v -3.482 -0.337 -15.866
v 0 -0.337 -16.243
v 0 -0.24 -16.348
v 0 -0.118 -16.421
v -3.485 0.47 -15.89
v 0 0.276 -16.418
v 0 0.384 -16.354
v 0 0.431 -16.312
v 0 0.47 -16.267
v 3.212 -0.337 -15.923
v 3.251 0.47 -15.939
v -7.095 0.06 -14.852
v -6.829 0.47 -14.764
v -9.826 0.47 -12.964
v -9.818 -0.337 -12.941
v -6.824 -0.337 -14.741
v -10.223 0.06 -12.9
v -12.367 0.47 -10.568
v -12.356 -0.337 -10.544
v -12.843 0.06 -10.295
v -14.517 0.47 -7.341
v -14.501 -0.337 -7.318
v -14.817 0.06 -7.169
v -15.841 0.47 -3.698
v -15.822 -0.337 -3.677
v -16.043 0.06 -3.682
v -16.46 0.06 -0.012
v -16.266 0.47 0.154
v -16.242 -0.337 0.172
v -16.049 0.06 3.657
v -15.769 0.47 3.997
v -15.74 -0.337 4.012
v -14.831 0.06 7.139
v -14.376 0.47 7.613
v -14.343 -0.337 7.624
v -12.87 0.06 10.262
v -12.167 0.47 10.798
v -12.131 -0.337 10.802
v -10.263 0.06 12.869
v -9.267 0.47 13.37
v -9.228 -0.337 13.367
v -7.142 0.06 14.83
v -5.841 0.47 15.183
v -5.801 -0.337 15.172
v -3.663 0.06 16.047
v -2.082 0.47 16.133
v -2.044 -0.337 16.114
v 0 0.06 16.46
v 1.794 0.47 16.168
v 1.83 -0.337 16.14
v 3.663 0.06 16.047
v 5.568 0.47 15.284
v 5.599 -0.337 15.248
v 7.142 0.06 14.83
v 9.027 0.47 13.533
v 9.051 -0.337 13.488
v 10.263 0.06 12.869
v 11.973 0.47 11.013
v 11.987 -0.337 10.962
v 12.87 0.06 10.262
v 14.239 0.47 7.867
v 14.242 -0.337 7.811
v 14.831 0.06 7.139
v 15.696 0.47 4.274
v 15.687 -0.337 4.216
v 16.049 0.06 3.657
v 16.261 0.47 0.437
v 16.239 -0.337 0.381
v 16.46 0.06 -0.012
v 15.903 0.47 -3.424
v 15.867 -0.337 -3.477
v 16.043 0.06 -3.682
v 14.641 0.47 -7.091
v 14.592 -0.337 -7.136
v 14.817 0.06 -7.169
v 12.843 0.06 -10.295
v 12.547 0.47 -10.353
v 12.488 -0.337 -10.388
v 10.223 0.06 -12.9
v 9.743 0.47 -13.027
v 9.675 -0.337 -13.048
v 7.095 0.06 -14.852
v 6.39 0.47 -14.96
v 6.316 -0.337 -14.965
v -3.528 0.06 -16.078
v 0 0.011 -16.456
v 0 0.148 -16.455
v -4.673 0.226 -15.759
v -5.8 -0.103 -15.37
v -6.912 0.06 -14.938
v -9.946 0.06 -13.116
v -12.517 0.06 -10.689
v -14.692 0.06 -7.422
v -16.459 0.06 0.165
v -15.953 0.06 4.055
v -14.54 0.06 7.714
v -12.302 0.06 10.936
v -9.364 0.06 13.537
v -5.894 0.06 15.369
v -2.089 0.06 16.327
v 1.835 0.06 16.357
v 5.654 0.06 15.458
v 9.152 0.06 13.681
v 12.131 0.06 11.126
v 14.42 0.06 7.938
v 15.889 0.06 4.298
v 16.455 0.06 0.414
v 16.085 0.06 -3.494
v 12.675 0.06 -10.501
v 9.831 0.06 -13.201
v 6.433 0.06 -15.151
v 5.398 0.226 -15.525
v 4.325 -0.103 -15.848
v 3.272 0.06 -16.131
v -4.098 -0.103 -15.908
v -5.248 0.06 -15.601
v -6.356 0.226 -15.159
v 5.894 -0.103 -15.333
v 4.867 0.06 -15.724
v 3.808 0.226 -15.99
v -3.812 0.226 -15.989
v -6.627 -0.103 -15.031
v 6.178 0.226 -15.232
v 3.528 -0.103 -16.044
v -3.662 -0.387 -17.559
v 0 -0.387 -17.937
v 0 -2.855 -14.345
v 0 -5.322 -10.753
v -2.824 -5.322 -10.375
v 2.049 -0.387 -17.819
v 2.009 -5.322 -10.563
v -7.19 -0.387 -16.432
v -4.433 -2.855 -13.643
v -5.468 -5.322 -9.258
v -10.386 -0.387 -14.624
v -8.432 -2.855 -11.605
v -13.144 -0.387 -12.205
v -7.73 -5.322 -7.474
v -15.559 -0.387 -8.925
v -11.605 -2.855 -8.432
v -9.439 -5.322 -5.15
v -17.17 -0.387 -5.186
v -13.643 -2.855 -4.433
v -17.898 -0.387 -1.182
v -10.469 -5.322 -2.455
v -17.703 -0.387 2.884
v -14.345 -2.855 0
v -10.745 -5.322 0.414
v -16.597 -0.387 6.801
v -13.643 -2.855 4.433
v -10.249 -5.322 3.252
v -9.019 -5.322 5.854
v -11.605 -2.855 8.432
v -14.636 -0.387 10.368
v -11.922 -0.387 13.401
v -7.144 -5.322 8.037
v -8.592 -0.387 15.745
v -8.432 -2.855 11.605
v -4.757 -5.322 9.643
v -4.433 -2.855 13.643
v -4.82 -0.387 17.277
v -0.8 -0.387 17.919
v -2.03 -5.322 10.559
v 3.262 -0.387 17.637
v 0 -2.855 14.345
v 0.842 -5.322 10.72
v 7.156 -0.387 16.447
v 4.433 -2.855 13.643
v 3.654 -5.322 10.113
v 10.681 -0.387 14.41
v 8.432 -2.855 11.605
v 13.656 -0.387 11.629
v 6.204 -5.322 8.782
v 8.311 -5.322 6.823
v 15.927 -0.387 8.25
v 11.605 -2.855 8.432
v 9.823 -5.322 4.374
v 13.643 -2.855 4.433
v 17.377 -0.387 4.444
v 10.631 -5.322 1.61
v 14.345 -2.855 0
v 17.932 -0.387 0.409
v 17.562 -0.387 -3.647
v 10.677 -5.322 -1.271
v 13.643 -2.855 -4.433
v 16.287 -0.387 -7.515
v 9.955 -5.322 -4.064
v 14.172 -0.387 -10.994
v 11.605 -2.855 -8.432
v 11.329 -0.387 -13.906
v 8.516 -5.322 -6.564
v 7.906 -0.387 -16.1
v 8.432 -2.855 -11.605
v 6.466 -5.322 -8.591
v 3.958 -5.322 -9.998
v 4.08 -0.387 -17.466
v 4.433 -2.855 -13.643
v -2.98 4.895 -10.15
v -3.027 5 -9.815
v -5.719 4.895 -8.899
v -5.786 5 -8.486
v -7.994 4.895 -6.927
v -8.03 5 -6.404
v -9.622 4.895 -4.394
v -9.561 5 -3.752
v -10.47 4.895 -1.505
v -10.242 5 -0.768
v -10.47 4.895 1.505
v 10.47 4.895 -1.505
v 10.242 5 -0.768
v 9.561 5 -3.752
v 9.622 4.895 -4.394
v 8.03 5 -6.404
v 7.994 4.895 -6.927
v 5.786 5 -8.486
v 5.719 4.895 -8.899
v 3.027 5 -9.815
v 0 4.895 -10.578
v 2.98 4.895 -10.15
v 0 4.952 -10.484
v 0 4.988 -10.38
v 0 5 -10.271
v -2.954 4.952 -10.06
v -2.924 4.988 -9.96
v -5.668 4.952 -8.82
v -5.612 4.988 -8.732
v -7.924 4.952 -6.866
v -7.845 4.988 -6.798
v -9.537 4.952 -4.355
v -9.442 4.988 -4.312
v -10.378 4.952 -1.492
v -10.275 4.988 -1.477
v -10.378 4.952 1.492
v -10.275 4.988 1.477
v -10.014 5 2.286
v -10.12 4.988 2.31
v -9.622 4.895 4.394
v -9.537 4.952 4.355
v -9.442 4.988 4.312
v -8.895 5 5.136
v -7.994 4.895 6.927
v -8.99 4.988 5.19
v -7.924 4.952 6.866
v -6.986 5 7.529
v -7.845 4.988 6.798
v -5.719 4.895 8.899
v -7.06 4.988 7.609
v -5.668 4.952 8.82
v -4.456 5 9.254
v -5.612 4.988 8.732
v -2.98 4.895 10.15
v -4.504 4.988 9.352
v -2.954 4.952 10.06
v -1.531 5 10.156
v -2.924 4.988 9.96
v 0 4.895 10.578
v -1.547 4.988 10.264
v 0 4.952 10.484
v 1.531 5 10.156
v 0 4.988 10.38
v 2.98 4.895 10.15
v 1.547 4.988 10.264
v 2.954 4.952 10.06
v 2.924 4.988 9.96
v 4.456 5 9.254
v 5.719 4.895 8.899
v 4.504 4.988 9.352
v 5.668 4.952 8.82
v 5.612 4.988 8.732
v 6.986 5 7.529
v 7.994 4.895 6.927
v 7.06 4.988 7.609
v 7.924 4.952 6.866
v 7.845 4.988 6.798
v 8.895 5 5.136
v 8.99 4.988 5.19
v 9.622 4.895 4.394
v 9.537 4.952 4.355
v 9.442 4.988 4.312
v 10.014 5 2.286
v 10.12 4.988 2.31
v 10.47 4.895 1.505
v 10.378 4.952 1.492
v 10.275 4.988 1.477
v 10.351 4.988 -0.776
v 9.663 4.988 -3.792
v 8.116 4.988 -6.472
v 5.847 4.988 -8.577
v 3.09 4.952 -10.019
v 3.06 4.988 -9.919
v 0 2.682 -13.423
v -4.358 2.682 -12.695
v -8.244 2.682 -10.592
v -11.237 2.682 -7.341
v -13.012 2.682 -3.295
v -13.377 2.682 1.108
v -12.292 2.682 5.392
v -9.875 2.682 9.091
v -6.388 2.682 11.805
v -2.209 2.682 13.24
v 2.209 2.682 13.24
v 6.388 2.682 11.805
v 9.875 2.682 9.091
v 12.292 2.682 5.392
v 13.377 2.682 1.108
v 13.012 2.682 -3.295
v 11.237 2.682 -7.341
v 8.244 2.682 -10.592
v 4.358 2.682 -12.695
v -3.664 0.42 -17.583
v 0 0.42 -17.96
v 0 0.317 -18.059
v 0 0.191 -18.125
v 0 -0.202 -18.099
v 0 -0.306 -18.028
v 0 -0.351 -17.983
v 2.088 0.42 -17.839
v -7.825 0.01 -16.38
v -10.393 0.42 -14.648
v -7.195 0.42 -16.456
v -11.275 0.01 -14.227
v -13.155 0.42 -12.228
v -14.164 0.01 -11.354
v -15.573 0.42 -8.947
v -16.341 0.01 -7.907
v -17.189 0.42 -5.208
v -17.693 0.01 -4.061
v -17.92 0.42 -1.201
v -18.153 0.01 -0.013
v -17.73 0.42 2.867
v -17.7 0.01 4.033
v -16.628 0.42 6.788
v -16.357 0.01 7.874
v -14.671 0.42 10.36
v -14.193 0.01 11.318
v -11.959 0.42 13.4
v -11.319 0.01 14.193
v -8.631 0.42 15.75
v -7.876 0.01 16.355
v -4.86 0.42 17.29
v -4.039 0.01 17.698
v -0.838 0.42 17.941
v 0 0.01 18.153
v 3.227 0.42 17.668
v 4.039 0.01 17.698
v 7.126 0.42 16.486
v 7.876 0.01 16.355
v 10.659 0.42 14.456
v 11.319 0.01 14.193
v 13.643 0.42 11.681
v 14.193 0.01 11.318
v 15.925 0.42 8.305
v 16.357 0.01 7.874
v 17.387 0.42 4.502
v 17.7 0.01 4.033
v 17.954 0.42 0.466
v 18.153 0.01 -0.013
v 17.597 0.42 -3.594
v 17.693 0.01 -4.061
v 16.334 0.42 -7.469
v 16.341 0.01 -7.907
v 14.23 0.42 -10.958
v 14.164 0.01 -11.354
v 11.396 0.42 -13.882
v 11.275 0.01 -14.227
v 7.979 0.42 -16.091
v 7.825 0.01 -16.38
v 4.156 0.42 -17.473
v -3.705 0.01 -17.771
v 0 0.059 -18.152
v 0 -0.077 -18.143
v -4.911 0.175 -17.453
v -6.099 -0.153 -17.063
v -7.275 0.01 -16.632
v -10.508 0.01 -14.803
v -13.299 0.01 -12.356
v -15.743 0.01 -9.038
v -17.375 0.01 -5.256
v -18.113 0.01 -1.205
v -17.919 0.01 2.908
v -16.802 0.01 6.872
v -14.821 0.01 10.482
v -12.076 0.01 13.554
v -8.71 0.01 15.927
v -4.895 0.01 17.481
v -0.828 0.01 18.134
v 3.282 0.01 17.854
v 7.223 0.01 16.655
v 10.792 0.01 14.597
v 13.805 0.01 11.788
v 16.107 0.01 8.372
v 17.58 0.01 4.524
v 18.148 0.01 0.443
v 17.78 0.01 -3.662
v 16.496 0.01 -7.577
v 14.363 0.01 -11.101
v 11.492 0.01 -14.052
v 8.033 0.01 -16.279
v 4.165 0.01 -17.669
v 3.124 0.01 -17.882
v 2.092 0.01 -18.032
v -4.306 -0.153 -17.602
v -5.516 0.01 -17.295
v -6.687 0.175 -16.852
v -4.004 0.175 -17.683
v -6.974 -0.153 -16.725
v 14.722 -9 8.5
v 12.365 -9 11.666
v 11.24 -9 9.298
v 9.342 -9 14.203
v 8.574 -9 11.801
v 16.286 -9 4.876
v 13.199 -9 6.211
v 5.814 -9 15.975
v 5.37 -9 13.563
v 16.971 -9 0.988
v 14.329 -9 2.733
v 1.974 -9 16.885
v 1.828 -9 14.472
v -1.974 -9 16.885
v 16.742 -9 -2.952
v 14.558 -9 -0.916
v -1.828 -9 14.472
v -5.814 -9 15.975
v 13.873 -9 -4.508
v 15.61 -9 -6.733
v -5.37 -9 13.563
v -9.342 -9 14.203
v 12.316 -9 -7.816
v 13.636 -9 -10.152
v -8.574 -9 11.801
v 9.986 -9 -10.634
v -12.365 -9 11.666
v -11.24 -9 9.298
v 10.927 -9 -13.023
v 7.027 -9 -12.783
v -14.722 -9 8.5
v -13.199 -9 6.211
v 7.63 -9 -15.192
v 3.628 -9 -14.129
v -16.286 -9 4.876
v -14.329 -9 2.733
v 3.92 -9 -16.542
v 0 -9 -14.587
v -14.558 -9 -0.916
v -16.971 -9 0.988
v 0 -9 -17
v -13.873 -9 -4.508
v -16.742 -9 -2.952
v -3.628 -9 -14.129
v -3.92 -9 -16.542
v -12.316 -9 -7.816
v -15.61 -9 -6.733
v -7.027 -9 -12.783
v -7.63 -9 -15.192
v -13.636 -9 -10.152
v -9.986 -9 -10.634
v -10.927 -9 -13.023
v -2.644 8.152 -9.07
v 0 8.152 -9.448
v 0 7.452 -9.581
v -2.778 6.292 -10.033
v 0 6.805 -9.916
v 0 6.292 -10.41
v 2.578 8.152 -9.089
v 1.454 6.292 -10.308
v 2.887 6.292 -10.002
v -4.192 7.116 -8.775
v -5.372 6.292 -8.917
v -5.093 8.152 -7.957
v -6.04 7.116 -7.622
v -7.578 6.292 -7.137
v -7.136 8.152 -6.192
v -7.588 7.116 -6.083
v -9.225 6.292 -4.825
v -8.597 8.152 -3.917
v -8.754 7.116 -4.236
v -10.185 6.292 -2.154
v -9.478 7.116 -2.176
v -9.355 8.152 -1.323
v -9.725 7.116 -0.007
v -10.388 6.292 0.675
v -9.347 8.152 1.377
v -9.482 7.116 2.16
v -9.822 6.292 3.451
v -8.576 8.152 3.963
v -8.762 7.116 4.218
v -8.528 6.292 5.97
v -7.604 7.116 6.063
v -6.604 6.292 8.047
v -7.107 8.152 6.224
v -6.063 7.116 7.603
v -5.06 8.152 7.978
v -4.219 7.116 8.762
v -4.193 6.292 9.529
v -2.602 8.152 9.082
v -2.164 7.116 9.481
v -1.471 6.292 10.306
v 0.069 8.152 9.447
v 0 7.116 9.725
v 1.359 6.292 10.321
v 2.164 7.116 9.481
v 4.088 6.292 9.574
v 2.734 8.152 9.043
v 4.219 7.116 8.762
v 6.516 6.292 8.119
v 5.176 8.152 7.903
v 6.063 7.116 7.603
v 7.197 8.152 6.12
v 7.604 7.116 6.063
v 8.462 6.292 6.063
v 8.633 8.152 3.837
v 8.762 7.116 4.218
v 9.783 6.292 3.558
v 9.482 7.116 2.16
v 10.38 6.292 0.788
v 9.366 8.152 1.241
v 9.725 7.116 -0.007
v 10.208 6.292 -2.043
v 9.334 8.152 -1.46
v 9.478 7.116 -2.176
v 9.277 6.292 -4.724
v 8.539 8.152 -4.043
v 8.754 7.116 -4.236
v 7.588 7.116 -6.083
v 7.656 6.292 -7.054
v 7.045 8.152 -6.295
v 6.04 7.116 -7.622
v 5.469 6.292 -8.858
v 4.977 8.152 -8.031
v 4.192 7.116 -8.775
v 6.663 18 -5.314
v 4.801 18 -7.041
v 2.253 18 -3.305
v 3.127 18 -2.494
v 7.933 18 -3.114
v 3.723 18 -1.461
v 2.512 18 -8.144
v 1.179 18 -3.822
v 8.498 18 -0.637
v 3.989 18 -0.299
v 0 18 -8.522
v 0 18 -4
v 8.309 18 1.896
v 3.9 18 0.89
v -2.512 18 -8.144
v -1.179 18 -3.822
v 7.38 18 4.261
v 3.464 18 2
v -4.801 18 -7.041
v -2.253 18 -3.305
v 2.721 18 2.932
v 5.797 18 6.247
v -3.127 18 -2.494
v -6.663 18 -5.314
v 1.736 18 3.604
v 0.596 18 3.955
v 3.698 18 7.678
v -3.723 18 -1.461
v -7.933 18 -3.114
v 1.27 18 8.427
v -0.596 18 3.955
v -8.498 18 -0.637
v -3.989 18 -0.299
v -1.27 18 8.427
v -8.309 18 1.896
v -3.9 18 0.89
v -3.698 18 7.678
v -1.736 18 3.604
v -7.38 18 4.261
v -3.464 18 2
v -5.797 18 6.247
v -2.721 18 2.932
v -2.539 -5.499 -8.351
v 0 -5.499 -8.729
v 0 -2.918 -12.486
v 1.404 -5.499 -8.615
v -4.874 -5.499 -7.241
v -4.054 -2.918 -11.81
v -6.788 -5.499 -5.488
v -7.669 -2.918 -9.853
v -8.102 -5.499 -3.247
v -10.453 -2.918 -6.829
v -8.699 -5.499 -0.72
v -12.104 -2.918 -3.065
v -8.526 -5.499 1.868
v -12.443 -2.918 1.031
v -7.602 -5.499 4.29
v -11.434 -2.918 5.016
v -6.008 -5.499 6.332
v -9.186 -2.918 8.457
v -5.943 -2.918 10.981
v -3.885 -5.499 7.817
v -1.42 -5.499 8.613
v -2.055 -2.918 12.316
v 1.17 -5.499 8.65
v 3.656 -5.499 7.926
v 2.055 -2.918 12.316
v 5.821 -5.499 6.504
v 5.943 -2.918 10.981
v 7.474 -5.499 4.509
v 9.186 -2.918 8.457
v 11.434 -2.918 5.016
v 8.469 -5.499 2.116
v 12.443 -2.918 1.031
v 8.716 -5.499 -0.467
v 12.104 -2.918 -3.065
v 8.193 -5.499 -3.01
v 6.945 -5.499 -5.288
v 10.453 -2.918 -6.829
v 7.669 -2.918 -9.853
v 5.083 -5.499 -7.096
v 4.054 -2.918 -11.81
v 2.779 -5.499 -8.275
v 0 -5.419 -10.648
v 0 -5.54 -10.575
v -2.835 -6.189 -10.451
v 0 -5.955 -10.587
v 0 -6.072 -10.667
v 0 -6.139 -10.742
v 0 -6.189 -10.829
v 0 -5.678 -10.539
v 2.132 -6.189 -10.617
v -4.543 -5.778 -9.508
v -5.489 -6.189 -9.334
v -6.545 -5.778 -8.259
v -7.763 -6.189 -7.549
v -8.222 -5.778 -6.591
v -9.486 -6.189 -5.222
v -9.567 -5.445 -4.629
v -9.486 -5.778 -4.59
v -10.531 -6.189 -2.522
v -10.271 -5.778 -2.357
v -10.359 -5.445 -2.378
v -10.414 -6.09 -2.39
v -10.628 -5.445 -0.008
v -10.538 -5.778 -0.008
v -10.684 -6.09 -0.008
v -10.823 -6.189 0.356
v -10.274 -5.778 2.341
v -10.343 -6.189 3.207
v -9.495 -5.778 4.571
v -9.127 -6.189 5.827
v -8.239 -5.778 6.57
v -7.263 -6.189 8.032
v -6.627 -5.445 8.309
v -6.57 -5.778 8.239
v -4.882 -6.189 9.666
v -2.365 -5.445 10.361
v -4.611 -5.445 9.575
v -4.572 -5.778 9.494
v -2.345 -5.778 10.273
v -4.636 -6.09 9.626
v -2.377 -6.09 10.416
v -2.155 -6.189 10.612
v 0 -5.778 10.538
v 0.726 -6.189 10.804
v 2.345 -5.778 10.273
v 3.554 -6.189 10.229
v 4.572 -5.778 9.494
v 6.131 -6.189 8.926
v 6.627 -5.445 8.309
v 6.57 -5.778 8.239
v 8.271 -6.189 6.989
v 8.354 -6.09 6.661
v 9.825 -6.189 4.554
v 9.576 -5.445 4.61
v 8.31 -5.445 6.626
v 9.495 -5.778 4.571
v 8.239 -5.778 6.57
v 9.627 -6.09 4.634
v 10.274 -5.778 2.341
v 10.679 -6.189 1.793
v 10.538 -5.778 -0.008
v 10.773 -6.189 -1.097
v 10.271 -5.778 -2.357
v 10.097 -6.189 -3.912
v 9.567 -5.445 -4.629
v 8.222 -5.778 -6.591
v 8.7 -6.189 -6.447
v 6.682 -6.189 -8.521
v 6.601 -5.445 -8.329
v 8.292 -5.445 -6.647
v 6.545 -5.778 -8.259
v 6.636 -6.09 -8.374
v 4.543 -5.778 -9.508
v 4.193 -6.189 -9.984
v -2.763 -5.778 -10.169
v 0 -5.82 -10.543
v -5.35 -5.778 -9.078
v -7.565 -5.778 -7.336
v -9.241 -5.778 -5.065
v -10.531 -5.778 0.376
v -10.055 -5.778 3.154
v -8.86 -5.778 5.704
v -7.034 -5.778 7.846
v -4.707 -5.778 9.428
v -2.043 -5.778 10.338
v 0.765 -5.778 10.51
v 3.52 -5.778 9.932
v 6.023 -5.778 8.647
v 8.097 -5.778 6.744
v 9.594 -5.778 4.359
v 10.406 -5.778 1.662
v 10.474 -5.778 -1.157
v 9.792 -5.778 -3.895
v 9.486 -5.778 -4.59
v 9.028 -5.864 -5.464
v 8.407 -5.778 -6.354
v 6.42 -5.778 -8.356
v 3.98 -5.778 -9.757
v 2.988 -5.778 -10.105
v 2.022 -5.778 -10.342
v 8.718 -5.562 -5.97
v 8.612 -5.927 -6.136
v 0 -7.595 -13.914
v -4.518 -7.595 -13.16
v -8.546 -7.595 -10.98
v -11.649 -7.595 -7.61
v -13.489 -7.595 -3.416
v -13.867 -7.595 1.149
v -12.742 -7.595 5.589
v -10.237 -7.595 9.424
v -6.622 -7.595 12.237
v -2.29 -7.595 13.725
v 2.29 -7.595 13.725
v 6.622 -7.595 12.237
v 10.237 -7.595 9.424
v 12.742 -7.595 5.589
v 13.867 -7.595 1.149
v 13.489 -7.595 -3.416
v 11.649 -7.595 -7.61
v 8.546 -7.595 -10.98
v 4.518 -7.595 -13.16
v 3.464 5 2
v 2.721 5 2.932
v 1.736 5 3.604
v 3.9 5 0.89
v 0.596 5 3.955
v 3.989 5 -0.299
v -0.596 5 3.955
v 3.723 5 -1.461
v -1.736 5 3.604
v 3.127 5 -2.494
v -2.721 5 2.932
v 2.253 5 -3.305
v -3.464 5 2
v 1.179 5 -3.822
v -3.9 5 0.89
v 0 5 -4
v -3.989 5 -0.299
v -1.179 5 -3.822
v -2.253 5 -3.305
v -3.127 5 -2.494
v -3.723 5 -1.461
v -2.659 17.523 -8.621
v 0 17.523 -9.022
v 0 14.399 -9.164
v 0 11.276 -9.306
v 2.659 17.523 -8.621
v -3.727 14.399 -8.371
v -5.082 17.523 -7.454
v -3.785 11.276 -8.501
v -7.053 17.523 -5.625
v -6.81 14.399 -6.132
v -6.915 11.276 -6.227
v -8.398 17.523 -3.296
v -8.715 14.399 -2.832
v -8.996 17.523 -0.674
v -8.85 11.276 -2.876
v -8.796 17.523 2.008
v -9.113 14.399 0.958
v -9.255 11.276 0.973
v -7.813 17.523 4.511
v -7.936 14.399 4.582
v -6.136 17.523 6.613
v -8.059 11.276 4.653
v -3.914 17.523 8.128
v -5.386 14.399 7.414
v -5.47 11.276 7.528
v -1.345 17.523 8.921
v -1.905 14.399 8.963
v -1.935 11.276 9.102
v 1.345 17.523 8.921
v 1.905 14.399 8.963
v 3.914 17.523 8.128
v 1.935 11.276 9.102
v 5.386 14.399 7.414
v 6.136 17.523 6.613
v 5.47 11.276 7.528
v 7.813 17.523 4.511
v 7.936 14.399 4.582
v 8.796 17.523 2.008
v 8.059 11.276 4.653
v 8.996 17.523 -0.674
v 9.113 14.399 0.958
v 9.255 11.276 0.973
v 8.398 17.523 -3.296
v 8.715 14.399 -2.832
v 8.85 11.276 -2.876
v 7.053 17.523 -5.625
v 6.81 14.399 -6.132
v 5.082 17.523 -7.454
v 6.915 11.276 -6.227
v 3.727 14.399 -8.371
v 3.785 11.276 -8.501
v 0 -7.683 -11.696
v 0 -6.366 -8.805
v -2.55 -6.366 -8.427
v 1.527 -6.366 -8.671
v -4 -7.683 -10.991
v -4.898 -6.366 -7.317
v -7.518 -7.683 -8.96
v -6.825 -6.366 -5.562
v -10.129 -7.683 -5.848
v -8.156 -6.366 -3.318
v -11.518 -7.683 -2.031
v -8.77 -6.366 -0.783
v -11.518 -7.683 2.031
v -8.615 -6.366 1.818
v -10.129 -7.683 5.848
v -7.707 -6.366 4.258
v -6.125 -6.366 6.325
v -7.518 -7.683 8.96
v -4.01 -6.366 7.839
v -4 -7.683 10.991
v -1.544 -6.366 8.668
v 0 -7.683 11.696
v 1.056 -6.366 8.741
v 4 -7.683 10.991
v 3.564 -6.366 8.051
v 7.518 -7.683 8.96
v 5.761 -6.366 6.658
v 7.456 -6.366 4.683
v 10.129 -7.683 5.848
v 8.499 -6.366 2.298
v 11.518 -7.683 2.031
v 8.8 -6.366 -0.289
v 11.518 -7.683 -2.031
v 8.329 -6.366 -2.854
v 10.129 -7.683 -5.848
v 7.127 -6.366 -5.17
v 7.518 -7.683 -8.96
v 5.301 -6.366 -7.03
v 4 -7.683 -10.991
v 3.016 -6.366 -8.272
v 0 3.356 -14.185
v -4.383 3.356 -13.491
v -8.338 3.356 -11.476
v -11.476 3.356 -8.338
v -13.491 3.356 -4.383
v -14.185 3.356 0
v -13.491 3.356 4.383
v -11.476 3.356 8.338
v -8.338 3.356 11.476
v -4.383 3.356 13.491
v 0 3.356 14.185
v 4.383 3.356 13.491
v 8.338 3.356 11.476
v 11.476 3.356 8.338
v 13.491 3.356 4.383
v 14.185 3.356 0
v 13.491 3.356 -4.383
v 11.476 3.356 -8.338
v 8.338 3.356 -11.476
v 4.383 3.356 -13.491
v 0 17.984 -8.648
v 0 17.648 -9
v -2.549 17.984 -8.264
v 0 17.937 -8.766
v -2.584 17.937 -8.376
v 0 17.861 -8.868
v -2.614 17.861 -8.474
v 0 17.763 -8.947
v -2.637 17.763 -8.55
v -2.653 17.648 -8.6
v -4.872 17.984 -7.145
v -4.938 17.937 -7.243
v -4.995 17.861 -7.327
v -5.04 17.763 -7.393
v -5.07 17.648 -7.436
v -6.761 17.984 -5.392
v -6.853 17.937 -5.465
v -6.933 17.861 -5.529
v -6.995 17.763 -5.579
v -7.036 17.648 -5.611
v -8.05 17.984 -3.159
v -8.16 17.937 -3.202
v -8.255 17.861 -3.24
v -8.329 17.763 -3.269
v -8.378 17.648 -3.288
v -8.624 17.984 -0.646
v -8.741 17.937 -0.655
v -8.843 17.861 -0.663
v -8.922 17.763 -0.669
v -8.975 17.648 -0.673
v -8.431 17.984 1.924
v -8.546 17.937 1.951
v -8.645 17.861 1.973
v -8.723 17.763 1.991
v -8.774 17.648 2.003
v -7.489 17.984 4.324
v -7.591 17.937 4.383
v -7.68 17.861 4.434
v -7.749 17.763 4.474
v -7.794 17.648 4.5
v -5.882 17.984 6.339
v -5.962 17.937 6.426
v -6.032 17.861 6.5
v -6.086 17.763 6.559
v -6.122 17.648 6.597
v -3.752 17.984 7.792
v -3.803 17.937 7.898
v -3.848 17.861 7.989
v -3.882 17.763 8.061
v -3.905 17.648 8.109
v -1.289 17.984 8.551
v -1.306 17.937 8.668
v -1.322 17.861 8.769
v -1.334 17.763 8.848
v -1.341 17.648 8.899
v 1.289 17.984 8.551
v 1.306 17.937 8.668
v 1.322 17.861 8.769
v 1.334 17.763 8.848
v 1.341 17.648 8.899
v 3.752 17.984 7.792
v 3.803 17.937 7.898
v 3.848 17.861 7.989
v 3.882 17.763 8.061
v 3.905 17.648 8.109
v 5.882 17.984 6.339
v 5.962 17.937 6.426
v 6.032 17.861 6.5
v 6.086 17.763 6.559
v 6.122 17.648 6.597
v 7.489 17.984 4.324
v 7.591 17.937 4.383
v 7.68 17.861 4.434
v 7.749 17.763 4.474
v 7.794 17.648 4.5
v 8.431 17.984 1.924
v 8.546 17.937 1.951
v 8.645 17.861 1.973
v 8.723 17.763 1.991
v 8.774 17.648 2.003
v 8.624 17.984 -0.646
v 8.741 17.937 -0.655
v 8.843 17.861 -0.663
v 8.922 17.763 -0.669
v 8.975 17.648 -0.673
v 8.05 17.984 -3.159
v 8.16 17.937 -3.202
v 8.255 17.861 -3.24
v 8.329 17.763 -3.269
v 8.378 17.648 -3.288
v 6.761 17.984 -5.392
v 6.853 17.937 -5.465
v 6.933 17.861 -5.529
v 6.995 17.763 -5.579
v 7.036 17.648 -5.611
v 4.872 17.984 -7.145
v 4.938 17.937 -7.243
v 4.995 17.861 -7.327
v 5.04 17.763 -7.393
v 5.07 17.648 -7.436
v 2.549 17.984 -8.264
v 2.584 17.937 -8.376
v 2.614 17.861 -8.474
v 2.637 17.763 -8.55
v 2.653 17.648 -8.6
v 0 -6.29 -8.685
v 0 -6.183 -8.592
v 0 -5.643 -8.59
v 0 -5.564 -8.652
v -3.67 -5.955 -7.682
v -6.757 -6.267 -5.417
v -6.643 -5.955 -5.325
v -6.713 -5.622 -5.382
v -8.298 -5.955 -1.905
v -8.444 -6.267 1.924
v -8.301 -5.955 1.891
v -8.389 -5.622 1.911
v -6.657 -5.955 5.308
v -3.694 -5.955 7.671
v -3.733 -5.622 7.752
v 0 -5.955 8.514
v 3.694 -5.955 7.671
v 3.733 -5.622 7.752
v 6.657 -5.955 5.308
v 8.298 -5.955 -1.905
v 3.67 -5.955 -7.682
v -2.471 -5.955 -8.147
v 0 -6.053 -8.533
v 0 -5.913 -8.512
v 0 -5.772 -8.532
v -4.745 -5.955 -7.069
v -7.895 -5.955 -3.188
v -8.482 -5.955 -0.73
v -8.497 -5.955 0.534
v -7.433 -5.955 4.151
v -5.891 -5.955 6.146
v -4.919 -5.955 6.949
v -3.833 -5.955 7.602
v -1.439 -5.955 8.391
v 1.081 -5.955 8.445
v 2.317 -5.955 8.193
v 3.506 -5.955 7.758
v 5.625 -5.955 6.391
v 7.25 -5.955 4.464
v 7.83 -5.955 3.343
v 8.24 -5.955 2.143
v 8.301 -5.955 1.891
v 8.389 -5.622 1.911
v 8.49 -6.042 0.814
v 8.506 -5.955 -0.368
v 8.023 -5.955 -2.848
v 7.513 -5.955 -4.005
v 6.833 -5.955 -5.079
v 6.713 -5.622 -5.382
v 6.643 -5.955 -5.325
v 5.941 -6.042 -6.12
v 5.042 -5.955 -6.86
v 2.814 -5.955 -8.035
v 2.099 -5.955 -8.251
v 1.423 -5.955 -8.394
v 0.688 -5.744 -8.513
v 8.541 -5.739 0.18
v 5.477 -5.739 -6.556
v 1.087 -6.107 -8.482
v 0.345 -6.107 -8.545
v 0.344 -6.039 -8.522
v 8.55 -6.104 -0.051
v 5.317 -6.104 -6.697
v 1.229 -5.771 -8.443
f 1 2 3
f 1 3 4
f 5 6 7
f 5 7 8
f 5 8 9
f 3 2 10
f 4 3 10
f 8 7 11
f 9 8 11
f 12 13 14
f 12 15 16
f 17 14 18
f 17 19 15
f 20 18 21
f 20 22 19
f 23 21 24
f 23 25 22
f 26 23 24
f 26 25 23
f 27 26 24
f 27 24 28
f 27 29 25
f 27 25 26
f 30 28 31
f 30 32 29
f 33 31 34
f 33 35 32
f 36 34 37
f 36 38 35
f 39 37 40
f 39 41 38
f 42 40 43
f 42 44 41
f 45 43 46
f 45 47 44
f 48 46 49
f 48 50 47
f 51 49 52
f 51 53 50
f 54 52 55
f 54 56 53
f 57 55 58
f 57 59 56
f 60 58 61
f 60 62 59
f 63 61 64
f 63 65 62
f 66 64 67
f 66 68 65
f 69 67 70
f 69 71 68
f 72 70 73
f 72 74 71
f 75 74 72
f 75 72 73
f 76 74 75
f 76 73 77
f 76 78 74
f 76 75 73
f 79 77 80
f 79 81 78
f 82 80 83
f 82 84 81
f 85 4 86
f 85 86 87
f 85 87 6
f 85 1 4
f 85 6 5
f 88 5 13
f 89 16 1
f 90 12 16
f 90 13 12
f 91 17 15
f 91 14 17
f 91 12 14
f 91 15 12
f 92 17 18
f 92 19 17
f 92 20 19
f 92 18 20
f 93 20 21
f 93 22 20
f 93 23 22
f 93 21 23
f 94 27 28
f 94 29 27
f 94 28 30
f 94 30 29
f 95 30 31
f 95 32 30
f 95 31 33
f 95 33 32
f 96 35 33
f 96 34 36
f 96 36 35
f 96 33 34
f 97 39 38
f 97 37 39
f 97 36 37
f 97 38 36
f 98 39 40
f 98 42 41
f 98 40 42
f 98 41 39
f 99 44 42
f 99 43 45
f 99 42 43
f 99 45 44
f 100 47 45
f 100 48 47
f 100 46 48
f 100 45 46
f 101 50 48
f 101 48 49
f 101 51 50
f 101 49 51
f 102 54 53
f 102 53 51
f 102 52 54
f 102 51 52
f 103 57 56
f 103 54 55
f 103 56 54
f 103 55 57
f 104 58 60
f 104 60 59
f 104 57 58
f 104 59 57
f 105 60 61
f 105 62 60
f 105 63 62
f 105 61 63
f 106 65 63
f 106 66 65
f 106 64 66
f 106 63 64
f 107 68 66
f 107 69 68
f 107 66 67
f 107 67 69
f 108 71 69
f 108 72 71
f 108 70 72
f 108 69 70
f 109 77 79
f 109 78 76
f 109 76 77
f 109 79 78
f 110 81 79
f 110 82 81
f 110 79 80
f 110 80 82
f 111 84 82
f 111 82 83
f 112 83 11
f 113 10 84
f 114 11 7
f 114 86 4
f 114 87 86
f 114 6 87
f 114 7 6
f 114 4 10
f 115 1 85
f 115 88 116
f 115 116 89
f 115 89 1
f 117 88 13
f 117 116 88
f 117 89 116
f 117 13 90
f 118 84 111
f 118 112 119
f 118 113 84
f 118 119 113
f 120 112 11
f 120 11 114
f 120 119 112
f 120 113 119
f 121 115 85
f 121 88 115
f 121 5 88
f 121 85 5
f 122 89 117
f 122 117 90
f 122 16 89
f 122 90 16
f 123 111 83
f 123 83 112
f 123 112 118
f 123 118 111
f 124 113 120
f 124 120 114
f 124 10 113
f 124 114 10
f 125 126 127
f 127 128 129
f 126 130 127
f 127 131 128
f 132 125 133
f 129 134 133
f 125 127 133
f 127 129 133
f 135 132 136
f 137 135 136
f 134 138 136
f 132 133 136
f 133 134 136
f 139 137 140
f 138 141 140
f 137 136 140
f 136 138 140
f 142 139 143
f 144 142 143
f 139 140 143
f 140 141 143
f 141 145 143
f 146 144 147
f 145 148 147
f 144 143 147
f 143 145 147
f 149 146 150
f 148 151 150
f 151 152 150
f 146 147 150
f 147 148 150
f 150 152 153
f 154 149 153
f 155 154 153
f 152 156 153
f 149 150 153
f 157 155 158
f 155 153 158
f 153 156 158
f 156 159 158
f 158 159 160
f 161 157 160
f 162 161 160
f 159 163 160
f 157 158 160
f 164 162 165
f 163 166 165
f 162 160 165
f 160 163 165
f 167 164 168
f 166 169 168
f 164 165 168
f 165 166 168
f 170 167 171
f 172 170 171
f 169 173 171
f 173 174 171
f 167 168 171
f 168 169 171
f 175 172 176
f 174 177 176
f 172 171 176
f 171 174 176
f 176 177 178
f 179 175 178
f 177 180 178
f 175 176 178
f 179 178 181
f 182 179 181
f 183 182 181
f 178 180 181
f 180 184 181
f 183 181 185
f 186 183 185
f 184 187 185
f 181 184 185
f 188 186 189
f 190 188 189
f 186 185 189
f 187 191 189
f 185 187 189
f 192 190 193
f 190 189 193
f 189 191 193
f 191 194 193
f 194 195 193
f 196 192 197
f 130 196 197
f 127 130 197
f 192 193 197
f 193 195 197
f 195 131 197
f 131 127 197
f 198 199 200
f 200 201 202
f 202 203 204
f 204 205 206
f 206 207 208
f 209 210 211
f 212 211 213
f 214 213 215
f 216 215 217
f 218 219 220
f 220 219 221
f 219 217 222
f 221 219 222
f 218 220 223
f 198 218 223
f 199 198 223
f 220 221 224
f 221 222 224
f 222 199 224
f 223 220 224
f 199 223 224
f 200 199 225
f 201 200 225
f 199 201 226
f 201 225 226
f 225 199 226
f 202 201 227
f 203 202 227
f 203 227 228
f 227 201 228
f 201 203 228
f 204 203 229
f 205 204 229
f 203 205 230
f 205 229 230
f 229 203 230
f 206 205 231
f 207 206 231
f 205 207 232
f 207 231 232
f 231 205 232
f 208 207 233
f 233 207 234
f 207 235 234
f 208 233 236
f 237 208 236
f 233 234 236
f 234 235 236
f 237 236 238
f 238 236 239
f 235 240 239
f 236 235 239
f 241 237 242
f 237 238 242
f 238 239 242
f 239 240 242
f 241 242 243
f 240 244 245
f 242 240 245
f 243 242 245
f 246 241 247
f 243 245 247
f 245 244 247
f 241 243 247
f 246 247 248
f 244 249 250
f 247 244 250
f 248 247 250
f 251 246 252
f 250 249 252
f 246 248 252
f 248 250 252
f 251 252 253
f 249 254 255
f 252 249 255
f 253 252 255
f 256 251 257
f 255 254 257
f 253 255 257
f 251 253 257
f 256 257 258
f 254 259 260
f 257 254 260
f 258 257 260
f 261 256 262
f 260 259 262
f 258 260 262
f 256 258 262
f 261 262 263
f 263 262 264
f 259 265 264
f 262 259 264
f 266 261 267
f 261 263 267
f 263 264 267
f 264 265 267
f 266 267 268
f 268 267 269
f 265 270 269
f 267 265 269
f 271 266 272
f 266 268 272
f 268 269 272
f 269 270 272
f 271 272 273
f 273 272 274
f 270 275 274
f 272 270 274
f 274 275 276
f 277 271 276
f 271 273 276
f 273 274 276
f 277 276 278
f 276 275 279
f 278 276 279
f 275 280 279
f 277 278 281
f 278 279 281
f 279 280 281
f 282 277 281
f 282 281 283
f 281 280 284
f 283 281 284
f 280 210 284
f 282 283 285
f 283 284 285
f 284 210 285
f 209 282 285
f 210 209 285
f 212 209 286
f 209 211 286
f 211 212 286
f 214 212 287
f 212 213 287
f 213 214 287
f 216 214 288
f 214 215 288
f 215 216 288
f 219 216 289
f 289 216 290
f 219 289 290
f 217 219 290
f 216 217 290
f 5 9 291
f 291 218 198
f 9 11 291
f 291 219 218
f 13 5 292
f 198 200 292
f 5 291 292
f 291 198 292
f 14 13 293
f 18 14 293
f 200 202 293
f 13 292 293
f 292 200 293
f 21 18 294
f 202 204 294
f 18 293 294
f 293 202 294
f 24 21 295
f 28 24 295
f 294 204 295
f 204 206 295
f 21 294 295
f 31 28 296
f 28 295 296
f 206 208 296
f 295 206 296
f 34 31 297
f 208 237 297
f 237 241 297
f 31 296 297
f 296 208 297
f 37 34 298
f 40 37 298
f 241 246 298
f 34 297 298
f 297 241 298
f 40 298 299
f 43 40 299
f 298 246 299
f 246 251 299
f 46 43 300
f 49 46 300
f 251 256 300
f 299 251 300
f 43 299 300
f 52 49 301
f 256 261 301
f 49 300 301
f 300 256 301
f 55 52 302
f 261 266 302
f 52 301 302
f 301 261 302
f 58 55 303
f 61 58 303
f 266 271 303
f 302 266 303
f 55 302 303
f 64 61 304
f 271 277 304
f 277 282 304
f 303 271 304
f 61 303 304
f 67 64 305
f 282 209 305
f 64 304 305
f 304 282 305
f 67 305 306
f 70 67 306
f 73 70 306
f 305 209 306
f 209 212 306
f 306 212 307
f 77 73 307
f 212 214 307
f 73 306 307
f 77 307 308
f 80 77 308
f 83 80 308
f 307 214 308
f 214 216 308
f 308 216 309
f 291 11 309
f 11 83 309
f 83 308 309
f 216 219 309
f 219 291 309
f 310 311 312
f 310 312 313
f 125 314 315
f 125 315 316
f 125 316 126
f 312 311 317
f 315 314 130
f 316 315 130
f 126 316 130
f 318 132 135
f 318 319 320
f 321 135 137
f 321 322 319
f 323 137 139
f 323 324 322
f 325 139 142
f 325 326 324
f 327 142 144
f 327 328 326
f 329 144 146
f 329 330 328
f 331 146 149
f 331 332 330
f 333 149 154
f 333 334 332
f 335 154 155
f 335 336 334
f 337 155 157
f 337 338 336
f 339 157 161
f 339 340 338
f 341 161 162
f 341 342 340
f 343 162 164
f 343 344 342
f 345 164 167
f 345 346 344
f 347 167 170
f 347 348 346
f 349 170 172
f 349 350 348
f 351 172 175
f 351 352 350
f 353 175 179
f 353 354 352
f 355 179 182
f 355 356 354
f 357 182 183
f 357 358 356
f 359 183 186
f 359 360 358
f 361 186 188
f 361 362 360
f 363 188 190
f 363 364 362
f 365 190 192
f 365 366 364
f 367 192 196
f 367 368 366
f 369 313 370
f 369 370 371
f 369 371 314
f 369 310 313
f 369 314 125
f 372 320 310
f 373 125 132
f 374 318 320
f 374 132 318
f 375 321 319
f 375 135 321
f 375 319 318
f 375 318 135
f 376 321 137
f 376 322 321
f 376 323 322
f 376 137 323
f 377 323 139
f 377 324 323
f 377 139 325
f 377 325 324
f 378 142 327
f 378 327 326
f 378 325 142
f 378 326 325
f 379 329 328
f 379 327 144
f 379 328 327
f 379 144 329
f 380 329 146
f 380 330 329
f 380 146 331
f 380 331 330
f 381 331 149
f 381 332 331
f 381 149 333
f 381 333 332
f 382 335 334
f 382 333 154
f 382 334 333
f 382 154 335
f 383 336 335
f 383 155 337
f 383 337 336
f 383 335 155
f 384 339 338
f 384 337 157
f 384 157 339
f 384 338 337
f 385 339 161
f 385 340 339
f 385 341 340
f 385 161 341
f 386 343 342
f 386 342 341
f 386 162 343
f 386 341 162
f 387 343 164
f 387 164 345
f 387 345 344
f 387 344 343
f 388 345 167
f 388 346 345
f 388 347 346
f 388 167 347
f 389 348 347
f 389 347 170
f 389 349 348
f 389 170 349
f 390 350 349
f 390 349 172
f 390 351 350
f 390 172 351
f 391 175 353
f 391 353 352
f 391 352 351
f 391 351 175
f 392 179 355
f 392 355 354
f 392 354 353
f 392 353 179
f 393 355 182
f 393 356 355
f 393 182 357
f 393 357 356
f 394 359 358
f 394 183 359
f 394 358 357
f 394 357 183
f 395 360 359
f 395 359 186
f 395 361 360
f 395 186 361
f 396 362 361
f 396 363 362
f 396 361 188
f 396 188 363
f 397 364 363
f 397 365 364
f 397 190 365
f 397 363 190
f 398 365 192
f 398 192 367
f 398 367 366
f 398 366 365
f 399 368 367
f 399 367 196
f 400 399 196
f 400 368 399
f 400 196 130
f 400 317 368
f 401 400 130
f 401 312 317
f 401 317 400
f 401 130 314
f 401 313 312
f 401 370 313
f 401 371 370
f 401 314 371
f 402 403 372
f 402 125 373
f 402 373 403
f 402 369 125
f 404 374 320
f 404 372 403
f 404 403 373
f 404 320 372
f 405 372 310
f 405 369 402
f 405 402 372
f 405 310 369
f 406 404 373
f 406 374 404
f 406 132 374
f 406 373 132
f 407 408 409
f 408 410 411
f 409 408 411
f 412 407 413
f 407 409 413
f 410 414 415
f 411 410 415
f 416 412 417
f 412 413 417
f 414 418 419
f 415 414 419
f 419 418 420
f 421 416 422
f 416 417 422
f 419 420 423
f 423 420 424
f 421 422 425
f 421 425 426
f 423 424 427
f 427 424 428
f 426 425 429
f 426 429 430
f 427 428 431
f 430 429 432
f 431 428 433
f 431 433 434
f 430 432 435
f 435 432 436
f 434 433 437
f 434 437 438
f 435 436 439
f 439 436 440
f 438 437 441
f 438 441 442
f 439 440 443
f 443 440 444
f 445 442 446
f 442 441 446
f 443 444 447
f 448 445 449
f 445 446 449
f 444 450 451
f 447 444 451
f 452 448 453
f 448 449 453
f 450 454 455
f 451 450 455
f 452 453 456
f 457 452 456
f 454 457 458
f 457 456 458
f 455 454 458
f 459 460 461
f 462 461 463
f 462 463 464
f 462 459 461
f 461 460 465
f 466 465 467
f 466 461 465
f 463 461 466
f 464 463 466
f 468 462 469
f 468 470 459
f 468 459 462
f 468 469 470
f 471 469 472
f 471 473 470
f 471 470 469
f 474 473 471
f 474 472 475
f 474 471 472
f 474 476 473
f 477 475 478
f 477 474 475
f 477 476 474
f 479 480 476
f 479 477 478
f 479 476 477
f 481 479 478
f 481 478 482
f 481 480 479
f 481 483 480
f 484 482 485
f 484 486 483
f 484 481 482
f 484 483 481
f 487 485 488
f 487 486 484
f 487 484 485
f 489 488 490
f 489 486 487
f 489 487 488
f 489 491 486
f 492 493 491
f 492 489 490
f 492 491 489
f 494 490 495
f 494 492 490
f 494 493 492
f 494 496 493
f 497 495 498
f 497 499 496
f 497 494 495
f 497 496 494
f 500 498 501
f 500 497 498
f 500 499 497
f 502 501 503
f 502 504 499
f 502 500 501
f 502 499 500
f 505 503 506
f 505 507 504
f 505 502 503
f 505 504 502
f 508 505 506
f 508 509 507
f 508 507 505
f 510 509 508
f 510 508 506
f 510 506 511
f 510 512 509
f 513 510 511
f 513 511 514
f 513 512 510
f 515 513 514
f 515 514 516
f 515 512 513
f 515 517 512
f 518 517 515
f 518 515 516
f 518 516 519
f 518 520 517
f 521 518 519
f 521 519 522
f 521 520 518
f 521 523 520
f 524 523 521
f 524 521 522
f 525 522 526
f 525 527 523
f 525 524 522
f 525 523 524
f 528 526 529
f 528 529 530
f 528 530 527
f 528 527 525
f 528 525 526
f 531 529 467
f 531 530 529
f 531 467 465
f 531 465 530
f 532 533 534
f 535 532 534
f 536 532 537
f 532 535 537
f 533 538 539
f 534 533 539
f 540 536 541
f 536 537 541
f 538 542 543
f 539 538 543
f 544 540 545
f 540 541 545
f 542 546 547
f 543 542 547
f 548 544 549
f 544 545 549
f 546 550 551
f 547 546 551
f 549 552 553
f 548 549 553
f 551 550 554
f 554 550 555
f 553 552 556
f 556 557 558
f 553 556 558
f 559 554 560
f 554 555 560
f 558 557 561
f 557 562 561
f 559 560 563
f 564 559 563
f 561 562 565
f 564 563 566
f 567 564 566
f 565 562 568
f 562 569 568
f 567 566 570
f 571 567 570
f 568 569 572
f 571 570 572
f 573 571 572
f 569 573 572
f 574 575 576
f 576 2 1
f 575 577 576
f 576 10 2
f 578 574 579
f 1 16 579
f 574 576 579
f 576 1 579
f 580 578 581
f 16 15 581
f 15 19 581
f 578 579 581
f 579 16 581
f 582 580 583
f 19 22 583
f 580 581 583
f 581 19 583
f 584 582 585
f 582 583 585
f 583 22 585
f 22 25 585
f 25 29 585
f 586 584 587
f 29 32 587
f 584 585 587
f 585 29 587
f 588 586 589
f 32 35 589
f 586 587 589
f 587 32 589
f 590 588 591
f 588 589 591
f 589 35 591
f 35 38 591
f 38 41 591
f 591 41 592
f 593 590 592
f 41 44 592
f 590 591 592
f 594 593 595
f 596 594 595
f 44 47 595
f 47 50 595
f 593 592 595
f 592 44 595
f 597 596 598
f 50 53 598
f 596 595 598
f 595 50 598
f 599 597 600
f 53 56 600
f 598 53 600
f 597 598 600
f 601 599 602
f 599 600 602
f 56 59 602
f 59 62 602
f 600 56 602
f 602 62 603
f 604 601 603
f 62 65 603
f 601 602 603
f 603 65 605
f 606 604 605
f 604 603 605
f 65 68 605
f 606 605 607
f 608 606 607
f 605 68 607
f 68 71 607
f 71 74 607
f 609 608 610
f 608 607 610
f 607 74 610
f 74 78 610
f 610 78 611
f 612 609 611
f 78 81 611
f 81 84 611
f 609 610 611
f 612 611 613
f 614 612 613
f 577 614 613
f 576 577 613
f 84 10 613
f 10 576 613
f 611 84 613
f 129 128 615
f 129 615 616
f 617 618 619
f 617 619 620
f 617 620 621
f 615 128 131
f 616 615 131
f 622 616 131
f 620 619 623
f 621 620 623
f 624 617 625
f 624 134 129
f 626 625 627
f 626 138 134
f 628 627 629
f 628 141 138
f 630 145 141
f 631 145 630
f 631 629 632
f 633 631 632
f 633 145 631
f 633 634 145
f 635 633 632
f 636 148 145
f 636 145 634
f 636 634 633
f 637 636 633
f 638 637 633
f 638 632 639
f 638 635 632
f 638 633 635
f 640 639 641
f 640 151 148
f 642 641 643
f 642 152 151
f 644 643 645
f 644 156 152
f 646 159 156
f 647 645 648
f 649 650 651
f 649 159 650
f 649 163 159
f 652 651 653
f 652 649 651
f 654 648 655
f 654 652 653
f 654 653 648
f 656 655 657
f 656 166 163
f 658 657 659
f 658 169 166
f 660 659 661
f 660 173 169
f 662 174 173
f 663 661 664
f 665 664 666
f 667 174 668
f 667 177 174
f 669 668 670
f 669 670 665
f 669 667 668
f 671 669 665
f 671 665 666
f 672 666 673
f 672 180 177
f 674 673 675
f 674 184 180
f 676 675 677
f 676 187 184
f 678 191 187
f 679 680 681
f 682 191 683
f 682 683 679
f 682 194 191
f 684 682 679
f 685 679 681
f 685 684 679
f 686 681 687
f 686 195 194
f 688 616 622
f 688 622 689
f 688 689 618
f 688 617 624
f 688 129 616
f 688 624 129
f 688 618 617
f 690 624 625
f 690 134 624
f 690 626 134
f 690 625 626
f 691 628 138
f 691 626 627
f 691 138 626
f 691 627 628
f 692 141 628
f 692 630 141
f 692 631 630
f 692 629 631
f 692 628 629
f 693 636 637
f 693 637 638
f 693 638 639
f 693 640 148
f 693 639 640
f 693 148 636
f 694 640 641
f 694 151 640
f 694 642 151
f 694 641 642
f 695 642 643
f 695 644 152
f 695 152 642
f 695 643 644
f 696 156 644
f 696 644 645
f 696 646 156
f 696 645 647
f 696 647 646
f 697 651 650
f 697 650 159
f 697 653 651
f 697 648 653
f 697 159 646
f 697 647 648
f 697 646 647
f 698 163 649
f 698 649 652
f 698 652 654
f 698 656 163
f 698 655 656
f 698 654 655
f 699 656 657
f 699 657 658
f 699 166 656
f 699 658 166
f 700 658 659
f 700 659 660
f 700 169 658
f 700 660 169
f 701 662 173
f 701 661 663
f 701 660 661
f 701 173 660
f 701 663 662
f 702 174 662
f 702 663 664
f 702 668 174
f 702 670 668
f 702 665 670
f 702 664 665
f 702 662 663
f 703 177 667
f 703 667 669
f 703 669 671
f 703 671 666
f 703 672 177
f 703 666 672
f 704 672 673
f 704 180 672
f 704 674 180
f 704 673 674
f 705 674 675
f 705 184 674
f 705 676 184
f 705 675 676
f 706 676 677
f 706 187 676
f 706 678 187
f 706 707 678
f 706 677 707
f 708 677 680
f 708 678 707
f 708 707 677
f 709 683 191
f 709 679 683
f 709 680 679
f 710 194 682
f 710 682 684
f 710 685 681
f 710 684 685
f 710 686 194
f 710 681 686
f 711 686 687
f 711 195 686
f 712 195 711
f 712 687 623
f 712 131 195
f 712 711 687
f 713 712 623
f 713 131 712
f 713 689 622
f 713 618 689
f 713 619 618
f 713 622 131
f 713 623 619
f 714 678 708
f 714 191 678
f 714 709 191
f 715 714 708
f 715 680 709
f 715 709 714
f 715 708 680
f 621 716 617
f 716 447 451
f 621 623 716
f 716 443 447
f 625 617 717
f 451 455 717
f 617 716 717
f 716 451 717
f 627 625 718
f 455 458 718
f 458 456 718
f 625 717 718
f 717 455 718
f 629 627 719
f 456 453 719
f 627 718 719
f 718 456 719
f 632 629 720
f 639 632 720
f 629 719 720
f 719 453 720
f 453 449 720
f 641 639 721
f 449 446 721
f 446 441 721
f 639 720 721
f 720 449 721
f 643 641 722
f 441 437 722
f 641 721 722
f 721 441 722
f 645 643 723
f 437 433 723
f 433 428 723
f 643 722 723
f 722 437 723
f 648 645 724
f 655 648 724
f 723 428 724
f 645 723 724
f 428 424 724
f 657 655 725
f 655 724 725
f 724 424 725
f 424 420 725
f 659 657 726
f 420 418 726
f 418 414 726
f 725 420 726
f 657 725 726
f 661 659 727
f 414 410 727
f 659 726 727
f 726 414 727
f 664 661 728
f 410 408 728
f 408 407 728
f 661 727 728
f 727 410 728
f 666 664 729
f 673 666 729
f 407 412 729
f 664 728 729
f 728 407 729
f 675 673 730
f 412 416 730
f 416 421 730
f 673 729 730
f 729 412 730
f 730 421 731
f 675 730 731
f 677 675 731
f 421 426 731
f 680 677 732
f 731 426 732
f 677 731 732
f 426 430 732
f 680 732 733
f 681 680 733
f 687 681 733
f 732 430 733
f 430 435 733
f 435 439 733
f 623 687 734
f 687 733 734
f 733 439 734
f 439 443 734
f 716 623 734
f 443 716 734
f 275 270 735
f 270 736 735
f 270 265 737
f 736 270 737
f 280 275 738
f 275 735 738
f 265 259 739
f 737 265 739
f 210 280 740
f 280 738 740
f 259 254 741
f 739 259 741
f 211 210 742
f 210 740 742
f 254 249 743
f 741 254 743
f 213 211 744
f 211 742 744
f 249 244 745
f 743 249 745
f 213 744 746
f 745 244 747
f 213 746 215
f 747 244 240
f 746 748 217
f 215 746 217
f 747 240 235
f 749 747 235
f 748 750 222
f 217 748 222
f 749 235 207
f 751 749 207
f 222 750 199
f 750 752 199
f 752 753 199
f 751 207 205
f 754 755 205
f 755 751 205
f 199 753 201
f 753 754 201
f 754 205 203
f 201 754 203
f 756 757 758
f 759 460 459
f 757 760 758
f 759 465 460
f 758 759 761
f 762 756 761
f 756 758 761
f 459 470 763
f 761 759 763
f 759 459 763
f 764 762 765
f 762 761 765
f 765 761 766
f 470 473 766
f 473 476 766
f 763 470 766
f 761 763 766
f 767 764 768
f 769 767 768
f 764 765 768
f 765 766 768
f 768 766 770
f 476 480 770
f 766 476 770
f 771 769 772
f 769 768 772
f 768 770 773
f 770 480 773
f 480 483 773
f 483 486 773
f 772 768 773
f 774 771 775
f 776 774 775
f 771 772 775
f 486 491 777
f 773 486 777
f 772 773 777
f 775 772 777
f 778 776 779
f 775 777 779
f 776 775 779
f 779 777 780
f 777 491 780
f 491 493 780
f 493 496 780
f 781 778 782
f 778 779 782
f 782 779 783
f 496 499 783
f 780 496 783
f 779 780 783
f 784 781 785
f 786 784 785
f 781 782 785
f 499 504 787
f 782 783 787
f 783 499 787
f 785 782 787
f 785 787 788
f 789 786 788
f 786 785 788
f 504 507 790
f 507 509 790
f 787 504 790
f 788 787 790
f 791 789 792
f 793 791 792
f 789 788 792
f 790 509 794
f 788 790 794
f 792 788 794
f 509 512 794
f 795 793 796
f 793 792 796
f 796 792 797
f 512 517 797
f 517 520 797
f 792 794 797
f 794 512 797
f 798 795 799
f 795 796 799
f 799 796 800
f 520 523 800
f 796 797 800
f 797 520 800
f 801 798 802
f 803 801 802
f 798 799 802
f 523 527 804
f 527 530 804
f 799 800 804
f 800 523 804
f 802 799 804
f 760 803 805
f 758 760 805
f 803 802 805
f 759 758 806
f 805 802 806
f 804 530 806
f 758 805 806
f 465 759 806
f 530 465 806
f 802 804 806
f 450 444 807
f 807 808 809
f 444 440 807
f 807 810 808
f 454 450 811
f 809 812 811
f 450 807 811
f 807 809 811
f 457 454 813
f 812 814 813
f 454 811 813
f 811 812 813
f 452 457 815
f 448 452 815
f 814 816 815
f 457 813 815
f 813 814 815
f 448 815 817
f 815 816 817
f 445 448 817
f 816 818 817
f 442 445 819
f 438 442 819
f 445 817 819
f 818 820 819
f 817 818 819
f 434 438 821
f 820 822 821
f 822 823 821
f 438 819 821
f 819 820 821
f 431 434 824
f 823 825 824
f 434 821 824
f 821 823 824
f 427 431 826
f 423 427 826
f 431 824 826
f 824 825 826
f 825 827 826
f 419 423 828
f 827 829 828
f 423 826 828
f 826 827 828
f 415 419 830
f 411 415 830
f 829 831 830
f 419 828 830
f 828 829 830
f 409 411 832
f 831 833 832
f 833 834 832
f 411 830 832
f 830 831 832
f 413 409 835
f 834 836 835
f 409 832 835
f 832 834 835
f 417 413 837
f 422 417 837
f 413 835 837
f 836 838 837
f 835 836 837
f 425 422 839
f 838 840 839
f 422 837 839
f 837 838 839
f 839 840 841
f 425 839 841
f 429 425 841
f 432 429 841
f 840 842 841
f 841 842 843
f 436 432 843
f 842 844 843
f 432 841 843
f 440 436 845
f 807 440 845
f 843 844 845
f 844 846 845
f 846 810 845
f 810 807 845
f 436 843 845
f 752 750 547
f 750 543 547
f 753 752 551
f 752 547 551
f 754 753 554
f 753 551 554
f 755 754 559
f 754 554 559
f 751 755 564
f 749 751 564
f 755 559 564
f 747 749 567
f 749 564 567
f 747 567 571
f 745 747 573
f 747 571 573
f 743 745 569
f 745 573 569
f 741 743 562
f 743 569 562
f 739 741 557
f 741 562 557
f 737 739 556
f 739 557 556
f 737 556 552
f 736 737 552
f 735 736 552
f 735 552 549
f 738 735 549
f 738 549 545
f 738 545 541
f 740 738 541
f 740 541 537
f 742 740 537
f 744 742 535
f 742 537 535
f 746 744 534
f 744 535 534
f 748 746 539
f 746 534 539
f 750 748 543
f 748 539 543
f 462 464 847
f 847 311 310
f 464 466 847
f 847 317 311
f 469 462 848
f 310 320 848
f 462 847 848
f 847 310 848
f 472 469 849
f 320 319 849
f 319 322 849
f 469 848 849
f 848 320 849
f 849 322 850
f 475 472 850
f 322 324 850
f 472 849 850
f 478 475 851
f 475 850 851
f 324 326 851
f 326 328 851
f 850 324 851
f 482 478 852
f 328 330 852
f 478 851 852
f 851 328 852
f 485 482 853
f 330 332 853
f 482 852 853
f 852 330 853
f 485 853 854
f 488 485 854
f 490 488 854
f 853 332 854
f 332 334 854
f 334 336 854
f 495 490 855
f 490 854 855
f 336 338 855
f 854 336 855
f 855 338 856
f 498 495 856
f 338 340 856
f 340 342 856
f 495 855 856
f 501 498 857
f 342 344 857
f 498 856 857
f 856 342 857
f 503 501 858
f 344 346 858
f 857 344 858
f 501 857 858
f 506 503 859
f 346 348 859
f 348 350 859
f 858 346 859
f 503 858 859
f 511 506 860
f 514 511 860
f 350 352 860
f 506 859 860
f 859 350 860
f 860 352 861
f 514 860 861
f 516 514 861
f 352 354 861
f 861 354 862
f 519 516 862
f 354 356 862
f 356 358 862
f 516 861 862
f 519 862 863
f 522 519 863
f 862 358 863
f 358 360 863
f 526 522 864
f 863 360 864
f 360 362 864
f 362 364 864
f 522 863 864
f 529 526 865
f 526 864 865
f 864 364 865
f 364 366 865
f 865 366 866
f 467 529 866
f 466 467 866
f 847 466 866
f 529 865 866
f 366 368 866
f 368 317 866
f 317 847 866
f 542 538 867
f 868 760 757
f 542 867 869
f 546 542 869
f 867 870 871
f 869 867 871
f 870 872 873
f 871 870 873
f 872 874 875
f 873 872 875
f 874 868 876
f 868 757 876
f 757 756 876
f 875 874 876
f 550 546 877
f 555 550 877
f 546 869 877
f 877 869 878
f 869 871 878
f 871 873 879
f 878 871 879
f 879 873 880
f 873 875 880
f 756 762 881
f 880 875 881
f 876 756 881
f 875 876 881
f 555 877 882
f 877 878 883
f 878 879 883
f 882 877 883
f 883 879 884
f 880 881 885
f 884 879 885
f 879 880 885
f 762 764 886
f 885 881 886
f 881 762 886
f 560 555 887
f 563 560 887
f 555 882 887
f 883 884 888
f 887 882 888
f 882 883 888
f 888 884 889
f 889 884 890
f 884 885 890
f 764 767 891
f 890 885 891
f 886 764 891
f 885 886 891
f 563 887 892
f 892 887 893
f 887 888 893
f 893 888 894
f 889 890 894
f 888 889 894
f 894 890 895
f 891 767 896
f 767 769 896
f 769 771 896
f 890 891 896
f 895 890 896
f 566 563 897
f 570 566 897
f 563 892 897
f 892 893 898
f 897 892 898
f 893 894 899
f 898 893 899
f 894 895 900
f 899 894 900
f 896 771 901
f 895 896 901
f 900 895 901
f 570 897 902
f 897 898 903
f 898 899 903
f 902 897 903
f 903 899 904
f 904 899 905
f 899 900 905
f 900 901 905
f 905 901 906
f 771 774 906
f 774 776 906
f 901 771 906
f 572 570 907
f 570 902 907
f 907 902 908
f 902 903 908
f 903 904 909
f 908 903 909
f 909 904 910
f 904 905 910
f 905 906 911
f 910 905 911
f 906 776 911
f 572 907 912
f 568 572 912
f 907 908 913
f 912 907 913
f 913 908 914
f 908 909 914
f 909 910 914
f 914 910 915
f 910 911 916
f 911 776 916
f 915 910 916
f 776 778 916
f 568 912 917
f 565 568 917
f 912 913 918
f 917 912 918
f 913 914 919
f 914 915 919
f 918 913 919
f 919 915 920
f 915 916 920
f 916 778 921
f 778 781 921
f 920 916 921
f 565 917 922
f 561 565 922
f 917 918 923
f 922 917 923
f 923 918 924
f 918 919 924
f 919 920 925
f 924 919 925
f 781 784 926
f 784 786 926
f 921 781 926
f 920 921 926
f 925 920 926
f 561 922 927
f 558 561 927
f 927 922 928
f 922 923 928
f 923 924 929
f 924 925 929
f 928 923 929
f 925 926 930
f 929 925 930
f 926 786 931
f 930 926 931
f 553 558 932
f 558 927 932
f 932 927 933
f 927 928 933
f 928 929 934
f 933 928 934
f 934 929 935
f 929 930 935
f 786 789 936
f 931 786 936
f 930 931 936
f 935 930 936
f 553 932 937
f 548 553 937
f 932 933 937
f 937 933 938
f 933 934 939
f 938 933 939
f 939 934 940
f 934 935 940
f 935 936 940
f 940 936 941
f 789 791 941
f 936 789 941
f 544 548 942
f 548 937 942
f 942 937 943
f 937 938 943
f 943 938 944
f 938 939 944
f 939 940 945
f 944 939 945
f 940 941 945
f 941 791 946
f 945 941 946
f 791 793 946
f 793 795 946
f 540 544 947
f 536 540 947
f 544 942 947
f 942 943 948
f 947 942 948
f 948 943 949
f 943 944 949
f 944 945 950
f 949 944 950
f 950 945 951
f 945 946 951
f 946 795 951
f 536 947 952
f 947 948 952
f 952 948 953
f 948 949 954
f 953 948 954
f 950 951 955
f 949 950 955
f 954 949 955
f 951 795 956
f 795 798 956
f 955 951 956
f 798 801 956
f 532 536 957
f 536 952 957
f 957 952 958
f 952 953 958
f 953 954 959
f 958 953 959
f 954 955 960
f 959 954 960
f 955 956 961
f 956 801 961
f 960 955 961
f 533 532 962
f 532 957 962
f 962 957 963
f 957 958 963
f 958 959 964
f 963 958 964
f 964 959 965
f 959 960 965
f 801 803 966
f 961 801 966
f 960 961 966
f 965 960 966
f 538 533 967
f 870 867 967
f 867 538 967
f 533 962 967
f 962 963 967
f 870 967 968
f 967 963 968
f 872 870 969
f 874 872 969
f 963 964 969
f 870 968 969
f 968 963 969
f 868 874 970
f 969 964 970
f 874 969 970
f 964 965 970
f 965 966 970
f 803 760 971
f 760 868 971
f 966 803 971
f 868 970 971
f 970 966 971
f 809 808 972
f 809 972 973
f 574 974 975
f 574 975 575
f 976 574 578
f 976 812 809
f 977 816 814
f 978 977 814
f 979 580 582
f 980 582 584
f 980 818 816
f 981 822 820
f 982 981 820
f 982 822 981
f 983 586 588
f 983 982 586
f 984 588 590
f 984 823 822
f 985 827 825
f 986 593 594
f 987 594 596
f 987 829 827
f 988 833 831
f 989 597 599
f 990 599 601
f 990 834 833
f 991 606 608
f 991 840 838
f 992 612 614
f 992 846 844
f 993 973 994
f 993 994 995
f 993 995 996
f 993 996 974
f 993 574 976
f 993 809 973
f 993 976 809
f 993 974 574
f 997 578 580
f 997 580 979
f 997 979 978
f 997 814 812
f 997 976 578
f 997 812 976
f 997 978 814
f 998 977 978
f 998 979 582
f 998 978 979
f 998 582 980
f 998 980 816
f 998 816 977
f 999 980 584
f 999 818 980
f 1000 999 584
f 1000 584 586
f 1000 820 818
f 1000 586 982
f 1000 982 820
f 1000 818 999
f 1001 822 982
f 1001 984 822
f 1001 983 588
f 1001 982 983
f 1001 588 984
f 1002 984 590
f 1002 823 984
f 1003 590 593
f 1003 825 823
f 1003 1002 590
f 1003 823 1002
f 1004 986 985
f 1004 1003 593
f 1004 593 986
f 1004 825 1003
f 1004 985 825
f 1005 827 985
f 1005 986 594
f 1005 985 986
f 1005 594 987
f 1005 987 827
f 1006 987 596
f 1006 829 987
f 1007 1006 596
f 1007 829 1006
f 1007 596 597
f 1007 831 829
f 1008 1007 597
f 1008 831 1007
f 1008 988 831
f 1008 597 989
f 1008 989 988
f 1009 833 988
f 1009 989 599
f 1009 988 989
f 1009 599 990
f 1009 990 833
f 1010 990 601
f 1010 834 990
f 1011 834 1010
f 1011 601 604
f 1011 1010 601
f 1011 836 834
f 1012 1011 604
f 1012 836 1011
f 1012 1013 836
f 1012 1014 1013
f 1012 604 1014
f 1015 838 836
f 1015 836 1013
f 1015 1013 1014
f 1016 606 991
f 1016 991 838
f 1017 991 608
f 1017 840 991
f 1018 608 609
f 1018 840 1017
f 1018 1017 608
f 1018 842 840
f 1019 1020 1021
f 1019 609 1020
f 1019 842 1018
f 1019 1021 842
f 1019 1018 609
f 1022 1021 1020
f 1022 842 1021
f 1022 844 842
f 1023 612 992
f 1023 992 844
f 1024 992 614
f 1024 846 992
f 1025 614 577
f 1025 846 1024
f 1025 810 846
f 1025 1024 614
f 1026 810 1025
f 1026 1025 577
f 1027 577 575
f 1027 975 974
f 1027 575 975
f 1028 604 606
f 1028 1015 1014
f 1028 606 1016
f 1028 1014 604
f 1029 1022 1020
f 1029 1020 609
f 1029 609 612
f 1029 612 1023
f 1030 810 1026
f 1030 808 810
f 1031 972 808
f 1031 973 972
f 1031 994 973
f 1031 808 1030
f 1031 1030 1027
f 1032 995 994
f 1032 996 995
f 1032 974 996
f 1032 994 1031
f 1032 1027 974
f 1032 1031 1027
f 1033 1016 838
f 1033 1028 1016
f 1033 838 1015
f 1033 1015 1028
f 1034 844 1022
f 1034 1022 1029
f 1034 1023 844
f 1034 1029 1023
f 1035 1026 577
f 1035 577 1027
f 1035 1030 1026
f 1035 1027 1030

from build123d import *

# Parameters (mm, degrees)
CONG_1_R = 0.5
CONG_2_R = 2.5


with BuildPart() as part:
    # Esquisse1 → Révolution1 (revolve)
    with BuildSketch(Plane.XY, mode=Mode.PRIVATE) as r_volution1_sk:
        Polygon((4, 18), (9, 18), (9.5, 7), (18.5, 0), (10.023859536, -5.822892875), (17, -9), (14.587257075, -9), (8, -6), (16.806816512, 0.050058907), (10.442606536, 5), (4, 5), align=None)
    revolve(r_volution1_sk.sketch.rotate(Axis((0, 0, 0), (0, 1, 0)), 90), axis=Axis((0, 0, 0), (0, 1, 0)))

    # Congé1
    cong_1_edges = [part.edges().sort_by_distance(p)[0] for p in [
        (0, -6, 8),
        (0, -5.822892875, 10.023859536),
        (0, 0, 18.5),
        (0, 18, 9),
        (0, 5, 10.442606536),
        (0, 0.050058907, 16.806816512),
    ]]
    fillet(cong_1_edges, radius=CONG_1_R)

    # Congé2
    cong_2_edges = [part.edges().sort_by_distance(p)[0] for p in [
        (0, 7, 9.5),
    ]]
    fillet(cong_2_edges, radius=CONG_2_R)


solid = part.part
